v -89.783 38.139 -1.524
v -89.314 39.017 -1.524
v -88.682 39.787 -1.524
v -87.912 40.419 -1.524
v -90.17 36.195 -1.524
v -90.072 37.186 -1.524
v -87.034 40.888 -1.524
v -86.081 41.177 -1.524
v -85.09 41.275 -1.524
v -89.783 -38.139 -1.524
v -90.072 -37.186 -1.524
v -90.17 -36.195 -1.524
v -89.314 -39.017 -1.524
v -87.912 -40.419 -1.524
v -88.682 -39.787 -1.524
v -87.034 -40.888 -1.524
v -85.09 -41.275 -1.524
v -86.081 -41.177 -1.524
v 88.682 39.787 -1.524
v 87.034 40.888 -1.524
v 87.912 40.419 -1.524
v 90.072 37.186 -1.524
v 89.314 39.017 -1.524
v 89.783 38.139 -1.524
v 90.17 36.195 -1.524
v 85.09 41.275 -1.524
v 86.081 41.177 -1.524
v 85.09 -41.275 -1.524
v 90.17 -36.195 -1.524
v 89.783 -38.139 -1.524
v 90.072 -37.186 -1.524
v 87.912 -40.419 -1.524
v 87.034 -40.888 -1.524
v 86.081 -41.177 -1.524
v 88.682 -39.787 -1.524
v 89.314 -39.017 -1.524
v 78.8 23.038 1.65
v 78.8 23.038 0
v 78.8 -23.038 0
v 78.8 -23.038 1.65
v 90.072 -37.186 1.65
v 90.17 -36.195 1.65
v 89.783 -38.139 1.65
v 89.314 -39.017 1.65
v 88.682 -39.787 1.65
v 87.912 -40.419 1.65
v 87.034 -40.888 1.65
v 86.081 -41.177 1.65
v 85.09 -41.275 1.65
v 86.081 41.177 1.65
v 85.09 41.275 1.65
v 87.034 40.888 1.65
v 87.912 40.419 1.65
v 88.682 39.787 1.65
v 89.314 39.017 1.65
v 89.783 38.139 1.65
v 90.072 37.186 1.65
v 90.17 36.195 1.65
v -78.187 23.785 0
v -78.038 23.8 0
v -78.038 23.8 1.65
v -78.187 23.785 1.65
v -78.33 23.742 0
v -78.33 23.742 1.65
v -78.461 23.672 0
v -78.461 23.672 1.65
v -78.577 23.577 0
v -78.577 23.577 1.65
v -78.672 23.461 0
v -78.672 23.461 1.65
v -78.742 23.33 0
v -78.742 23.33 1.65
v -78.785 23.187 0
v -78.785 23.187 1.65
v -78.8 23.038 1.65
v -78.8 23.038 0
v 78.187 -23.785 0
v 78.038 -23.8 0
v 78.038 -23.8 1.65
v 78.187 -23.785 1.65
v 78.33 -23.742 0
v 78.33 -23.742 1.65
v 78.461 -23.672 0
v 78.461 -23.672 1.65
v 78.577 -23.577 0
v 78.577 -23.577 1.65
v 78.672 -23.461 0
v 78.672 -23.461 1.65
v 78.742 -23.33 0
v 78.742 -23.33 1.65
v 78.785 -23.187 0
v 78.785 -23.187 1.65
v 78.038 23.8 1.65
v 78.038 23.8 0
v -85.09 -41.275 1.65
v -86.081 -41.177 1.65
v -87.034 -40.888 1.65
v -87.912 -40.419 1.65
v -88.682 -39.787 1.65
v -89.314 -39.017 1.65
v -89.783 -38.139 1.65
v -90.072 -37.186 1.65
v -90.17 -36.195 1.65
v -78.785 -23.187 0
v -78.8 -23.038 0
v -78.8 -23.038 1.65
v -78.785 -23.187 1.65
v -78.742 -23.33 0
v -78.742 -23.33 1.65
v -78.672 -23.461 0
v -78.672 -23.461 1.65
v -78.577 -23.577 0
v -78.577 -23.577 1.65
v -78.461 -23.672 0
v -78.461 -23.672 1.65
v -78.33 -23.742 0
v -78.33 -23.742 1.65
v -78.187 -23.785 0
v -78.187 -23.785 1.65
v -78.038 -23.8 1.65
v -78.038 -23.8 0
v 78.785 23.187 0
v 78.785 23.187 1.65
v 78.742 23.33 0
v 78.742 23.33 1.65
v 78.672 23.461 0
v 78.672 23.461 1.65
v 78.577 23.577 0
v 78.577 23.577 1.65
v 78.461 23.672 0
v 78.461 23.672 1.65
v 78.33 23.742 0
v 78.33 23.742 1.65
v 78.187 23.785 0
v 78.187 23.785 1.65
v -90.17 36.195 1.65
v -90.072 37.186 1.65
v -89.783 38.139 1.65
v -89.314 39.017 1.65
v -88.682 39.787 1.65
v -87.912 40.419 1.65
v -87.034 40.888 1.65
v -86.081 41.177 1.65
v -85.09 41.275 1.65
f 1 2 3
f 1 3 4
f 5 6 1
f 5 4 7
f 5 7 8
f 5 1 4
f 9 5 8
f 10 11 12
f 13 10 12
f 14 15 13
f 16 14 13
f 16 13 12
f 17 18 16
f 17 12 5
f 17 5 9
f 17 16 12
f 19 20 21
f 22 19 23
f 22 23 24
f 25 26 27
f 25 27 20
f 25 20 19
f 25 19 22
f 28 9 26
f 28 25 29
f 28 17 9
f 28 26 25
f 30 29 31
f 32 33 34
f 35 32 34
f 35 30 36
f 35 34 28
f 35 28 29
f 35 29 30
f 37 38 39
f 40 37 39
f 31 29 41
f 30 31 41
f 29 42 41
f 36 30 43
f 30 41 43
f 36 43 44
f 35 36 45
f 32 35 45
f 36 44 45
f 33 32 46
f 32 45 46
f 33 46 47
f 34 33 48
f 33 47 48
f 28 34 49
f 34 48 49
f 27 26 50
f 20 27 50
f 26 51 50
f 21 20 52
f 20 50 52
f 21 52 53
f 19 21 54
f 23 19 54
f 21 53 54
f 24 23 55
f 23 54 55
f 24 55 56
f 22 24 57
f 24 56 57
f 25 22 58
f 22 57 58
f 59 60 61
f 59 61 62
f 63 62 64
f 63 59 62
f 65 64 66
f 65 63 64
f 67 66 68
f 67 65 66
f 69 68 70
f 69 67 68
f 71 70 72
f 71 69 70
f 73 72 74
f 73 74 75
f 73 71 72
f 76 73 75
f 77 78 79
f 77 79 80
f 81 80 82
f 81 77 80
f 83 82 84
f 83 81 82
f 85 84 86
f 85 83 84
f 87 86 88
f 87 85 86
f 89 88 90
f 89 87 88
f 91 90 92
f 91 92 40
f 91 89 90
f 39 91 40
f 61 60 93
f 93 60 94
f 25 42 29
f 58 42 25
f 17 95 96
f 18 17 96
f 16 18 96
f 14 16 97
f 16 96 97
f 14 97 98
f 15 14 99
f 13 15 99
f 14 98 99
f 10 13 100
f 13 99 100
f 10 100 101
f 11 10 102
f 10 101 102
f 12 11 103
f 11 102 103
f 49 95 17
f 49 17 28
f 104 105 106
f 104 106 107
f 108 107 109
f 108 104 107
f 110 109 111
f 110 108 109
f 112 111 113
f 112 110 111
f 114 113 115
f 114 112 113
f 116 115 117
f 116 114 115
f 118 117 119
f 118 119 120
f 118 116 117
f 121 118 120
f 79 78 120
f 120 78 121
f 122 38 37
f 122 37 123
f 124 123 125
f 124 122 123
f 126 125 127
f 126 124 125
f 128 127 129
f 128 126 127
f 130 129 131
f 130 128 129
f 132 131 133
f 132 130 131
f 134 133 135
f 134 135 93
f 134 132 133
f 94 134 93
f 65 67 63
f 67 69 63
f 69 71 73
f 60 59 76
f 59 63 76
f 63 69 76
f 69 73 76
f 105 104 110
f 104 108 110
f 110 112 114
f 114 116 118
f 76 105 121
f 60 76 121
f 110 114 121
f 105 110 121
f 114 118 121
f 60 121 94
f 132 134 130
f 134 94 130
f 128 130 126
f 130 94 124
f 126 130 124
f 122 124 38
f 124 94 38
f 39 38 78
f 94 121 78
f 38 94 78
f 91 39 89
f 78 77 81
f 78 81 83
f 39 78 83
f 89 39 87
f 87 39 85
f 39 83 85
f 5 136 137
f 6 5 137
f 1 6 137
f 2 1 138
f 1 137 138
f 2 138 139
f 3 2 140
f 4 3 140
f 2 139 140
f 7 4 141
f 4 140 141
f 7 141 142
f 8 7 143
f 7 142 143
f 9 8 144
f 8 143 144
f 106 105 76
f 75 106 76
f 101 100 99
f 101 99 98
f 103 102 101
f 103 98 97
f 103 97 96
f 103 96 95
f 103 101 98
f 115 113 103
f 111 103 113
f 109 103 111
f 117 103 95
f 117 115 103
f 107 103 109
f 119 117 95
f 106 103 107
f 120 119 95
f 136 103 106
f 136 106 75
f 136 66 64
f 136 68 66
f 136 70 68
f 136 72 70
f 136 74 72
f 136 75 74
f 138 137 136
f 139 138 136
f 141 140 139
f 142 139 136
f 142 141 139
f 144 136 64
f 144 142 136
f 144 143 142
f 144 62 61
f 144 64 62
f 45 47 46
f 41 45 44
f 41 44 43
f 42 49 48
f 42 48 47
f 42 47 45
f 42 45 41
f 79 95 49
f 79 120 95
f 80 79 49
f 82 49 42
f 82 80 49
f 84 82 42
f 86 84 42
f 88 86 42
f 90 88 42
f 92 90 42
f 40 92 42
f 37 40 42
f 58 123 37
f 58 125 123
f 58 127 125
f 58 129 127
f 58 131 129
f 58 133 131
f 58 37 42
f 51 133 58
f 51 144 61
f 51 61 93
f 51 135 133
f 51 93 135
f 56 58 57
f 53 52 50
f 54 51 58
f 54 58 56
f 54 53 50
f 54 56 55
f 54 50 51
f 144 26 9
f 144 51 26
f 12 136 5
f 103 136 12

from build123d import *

# Parameters (mm, degrees)
PAD_DEPTH    = 1.65
PAD001_DEPTH = 1.524


with BuildPart() as part:
    # Sketch → Pad (new body)
    with BuildSketch(Plane.XY):
        with BuildLine():
            ThreePointArc((-90.17, -36.195), (-88.682102, -39.787102), (-85.09, -41.275))
            Line((85.09, -41.275), (-85.09, -41.275))
            ThreePointArc((85.09, -41.275), (88.682102, -39.787102), (90.17, -36.195))
            Line((90.17, 36.195), (90.17, -36.195))
            ThreePointArc((90.17, 36.195), (88.682102, 39.787102), (85.09, 41.275))
            Line((-85.09, 41.275), (85.09, 41.275))
            ThreePointArc((-85.09, 41.275), (-88.682102, 39.787102), (-90.17, 36.195))
            Line((-90.17, -36.195), (-90.17, 36.195))
        make_face()
        with BuildLine():
            ThreePointArc((-78.8, -23.038), (-78.576815, -23.576815), (-78.038, -23.8))
            Line((78.038, -23.8), (-78.038, -23.8))
            ThreePointArc((78.038, -23.8), (78.576815, -23.576815), (78.8, -23.038))
            Line((78.8, 23.038), (78.8, -23.038))
            ThreePointArc((78.8, 23.038), (78.576815, 23.576815), (78.038, 23.8))
            Line((-78.038, 23.8), (78.038, 23.8))
            ThreePointArc((-78.038, 23.8), (-78.576815, 23.576815), (-78.8, 23.038))
            Line((-78.8, -23.038), (-78.8, 23.038))
        make_face(mode=Mode.SUBTRACT)
    extrude(amount=PAD_DEPTH)

    # Sketch001 (on Face17 of Pad) → Pad001 (join)
    with BuildSketch(Plane(origin=(0, 0, 0), x_dir=(1, 0, 0), z_dir=(0, 0, -1))):
        with BuildLine():
            ThreePointArc((-90.17, -36.195), (-88.682102, -39.787102), (-85.09, -41.275))
            Line((85.09, -41.275), (-85.09, -41.275))
            ThreePointArc((85.09, -41.275), (88.682102, -39.787102), (90.17, -36.195))
            Line((90.17, 36.195), (90.17, -36.195))
            ThreePointArc((90.17, 36.195), (88.682102, 39.787102), (85.09, 41.275))
            Line((-85.09, 41.275), (85.09, 41.275))
            ThreePointArc((-85.09, 41.275), (-88.682102, 39.787102), (-90.17, 36.195))
            Line((-90.17, -36.195), (-90.17, 36.195))
        make_face()
    extrude(amount=PAD001_DEPTH)


solid = part.part
